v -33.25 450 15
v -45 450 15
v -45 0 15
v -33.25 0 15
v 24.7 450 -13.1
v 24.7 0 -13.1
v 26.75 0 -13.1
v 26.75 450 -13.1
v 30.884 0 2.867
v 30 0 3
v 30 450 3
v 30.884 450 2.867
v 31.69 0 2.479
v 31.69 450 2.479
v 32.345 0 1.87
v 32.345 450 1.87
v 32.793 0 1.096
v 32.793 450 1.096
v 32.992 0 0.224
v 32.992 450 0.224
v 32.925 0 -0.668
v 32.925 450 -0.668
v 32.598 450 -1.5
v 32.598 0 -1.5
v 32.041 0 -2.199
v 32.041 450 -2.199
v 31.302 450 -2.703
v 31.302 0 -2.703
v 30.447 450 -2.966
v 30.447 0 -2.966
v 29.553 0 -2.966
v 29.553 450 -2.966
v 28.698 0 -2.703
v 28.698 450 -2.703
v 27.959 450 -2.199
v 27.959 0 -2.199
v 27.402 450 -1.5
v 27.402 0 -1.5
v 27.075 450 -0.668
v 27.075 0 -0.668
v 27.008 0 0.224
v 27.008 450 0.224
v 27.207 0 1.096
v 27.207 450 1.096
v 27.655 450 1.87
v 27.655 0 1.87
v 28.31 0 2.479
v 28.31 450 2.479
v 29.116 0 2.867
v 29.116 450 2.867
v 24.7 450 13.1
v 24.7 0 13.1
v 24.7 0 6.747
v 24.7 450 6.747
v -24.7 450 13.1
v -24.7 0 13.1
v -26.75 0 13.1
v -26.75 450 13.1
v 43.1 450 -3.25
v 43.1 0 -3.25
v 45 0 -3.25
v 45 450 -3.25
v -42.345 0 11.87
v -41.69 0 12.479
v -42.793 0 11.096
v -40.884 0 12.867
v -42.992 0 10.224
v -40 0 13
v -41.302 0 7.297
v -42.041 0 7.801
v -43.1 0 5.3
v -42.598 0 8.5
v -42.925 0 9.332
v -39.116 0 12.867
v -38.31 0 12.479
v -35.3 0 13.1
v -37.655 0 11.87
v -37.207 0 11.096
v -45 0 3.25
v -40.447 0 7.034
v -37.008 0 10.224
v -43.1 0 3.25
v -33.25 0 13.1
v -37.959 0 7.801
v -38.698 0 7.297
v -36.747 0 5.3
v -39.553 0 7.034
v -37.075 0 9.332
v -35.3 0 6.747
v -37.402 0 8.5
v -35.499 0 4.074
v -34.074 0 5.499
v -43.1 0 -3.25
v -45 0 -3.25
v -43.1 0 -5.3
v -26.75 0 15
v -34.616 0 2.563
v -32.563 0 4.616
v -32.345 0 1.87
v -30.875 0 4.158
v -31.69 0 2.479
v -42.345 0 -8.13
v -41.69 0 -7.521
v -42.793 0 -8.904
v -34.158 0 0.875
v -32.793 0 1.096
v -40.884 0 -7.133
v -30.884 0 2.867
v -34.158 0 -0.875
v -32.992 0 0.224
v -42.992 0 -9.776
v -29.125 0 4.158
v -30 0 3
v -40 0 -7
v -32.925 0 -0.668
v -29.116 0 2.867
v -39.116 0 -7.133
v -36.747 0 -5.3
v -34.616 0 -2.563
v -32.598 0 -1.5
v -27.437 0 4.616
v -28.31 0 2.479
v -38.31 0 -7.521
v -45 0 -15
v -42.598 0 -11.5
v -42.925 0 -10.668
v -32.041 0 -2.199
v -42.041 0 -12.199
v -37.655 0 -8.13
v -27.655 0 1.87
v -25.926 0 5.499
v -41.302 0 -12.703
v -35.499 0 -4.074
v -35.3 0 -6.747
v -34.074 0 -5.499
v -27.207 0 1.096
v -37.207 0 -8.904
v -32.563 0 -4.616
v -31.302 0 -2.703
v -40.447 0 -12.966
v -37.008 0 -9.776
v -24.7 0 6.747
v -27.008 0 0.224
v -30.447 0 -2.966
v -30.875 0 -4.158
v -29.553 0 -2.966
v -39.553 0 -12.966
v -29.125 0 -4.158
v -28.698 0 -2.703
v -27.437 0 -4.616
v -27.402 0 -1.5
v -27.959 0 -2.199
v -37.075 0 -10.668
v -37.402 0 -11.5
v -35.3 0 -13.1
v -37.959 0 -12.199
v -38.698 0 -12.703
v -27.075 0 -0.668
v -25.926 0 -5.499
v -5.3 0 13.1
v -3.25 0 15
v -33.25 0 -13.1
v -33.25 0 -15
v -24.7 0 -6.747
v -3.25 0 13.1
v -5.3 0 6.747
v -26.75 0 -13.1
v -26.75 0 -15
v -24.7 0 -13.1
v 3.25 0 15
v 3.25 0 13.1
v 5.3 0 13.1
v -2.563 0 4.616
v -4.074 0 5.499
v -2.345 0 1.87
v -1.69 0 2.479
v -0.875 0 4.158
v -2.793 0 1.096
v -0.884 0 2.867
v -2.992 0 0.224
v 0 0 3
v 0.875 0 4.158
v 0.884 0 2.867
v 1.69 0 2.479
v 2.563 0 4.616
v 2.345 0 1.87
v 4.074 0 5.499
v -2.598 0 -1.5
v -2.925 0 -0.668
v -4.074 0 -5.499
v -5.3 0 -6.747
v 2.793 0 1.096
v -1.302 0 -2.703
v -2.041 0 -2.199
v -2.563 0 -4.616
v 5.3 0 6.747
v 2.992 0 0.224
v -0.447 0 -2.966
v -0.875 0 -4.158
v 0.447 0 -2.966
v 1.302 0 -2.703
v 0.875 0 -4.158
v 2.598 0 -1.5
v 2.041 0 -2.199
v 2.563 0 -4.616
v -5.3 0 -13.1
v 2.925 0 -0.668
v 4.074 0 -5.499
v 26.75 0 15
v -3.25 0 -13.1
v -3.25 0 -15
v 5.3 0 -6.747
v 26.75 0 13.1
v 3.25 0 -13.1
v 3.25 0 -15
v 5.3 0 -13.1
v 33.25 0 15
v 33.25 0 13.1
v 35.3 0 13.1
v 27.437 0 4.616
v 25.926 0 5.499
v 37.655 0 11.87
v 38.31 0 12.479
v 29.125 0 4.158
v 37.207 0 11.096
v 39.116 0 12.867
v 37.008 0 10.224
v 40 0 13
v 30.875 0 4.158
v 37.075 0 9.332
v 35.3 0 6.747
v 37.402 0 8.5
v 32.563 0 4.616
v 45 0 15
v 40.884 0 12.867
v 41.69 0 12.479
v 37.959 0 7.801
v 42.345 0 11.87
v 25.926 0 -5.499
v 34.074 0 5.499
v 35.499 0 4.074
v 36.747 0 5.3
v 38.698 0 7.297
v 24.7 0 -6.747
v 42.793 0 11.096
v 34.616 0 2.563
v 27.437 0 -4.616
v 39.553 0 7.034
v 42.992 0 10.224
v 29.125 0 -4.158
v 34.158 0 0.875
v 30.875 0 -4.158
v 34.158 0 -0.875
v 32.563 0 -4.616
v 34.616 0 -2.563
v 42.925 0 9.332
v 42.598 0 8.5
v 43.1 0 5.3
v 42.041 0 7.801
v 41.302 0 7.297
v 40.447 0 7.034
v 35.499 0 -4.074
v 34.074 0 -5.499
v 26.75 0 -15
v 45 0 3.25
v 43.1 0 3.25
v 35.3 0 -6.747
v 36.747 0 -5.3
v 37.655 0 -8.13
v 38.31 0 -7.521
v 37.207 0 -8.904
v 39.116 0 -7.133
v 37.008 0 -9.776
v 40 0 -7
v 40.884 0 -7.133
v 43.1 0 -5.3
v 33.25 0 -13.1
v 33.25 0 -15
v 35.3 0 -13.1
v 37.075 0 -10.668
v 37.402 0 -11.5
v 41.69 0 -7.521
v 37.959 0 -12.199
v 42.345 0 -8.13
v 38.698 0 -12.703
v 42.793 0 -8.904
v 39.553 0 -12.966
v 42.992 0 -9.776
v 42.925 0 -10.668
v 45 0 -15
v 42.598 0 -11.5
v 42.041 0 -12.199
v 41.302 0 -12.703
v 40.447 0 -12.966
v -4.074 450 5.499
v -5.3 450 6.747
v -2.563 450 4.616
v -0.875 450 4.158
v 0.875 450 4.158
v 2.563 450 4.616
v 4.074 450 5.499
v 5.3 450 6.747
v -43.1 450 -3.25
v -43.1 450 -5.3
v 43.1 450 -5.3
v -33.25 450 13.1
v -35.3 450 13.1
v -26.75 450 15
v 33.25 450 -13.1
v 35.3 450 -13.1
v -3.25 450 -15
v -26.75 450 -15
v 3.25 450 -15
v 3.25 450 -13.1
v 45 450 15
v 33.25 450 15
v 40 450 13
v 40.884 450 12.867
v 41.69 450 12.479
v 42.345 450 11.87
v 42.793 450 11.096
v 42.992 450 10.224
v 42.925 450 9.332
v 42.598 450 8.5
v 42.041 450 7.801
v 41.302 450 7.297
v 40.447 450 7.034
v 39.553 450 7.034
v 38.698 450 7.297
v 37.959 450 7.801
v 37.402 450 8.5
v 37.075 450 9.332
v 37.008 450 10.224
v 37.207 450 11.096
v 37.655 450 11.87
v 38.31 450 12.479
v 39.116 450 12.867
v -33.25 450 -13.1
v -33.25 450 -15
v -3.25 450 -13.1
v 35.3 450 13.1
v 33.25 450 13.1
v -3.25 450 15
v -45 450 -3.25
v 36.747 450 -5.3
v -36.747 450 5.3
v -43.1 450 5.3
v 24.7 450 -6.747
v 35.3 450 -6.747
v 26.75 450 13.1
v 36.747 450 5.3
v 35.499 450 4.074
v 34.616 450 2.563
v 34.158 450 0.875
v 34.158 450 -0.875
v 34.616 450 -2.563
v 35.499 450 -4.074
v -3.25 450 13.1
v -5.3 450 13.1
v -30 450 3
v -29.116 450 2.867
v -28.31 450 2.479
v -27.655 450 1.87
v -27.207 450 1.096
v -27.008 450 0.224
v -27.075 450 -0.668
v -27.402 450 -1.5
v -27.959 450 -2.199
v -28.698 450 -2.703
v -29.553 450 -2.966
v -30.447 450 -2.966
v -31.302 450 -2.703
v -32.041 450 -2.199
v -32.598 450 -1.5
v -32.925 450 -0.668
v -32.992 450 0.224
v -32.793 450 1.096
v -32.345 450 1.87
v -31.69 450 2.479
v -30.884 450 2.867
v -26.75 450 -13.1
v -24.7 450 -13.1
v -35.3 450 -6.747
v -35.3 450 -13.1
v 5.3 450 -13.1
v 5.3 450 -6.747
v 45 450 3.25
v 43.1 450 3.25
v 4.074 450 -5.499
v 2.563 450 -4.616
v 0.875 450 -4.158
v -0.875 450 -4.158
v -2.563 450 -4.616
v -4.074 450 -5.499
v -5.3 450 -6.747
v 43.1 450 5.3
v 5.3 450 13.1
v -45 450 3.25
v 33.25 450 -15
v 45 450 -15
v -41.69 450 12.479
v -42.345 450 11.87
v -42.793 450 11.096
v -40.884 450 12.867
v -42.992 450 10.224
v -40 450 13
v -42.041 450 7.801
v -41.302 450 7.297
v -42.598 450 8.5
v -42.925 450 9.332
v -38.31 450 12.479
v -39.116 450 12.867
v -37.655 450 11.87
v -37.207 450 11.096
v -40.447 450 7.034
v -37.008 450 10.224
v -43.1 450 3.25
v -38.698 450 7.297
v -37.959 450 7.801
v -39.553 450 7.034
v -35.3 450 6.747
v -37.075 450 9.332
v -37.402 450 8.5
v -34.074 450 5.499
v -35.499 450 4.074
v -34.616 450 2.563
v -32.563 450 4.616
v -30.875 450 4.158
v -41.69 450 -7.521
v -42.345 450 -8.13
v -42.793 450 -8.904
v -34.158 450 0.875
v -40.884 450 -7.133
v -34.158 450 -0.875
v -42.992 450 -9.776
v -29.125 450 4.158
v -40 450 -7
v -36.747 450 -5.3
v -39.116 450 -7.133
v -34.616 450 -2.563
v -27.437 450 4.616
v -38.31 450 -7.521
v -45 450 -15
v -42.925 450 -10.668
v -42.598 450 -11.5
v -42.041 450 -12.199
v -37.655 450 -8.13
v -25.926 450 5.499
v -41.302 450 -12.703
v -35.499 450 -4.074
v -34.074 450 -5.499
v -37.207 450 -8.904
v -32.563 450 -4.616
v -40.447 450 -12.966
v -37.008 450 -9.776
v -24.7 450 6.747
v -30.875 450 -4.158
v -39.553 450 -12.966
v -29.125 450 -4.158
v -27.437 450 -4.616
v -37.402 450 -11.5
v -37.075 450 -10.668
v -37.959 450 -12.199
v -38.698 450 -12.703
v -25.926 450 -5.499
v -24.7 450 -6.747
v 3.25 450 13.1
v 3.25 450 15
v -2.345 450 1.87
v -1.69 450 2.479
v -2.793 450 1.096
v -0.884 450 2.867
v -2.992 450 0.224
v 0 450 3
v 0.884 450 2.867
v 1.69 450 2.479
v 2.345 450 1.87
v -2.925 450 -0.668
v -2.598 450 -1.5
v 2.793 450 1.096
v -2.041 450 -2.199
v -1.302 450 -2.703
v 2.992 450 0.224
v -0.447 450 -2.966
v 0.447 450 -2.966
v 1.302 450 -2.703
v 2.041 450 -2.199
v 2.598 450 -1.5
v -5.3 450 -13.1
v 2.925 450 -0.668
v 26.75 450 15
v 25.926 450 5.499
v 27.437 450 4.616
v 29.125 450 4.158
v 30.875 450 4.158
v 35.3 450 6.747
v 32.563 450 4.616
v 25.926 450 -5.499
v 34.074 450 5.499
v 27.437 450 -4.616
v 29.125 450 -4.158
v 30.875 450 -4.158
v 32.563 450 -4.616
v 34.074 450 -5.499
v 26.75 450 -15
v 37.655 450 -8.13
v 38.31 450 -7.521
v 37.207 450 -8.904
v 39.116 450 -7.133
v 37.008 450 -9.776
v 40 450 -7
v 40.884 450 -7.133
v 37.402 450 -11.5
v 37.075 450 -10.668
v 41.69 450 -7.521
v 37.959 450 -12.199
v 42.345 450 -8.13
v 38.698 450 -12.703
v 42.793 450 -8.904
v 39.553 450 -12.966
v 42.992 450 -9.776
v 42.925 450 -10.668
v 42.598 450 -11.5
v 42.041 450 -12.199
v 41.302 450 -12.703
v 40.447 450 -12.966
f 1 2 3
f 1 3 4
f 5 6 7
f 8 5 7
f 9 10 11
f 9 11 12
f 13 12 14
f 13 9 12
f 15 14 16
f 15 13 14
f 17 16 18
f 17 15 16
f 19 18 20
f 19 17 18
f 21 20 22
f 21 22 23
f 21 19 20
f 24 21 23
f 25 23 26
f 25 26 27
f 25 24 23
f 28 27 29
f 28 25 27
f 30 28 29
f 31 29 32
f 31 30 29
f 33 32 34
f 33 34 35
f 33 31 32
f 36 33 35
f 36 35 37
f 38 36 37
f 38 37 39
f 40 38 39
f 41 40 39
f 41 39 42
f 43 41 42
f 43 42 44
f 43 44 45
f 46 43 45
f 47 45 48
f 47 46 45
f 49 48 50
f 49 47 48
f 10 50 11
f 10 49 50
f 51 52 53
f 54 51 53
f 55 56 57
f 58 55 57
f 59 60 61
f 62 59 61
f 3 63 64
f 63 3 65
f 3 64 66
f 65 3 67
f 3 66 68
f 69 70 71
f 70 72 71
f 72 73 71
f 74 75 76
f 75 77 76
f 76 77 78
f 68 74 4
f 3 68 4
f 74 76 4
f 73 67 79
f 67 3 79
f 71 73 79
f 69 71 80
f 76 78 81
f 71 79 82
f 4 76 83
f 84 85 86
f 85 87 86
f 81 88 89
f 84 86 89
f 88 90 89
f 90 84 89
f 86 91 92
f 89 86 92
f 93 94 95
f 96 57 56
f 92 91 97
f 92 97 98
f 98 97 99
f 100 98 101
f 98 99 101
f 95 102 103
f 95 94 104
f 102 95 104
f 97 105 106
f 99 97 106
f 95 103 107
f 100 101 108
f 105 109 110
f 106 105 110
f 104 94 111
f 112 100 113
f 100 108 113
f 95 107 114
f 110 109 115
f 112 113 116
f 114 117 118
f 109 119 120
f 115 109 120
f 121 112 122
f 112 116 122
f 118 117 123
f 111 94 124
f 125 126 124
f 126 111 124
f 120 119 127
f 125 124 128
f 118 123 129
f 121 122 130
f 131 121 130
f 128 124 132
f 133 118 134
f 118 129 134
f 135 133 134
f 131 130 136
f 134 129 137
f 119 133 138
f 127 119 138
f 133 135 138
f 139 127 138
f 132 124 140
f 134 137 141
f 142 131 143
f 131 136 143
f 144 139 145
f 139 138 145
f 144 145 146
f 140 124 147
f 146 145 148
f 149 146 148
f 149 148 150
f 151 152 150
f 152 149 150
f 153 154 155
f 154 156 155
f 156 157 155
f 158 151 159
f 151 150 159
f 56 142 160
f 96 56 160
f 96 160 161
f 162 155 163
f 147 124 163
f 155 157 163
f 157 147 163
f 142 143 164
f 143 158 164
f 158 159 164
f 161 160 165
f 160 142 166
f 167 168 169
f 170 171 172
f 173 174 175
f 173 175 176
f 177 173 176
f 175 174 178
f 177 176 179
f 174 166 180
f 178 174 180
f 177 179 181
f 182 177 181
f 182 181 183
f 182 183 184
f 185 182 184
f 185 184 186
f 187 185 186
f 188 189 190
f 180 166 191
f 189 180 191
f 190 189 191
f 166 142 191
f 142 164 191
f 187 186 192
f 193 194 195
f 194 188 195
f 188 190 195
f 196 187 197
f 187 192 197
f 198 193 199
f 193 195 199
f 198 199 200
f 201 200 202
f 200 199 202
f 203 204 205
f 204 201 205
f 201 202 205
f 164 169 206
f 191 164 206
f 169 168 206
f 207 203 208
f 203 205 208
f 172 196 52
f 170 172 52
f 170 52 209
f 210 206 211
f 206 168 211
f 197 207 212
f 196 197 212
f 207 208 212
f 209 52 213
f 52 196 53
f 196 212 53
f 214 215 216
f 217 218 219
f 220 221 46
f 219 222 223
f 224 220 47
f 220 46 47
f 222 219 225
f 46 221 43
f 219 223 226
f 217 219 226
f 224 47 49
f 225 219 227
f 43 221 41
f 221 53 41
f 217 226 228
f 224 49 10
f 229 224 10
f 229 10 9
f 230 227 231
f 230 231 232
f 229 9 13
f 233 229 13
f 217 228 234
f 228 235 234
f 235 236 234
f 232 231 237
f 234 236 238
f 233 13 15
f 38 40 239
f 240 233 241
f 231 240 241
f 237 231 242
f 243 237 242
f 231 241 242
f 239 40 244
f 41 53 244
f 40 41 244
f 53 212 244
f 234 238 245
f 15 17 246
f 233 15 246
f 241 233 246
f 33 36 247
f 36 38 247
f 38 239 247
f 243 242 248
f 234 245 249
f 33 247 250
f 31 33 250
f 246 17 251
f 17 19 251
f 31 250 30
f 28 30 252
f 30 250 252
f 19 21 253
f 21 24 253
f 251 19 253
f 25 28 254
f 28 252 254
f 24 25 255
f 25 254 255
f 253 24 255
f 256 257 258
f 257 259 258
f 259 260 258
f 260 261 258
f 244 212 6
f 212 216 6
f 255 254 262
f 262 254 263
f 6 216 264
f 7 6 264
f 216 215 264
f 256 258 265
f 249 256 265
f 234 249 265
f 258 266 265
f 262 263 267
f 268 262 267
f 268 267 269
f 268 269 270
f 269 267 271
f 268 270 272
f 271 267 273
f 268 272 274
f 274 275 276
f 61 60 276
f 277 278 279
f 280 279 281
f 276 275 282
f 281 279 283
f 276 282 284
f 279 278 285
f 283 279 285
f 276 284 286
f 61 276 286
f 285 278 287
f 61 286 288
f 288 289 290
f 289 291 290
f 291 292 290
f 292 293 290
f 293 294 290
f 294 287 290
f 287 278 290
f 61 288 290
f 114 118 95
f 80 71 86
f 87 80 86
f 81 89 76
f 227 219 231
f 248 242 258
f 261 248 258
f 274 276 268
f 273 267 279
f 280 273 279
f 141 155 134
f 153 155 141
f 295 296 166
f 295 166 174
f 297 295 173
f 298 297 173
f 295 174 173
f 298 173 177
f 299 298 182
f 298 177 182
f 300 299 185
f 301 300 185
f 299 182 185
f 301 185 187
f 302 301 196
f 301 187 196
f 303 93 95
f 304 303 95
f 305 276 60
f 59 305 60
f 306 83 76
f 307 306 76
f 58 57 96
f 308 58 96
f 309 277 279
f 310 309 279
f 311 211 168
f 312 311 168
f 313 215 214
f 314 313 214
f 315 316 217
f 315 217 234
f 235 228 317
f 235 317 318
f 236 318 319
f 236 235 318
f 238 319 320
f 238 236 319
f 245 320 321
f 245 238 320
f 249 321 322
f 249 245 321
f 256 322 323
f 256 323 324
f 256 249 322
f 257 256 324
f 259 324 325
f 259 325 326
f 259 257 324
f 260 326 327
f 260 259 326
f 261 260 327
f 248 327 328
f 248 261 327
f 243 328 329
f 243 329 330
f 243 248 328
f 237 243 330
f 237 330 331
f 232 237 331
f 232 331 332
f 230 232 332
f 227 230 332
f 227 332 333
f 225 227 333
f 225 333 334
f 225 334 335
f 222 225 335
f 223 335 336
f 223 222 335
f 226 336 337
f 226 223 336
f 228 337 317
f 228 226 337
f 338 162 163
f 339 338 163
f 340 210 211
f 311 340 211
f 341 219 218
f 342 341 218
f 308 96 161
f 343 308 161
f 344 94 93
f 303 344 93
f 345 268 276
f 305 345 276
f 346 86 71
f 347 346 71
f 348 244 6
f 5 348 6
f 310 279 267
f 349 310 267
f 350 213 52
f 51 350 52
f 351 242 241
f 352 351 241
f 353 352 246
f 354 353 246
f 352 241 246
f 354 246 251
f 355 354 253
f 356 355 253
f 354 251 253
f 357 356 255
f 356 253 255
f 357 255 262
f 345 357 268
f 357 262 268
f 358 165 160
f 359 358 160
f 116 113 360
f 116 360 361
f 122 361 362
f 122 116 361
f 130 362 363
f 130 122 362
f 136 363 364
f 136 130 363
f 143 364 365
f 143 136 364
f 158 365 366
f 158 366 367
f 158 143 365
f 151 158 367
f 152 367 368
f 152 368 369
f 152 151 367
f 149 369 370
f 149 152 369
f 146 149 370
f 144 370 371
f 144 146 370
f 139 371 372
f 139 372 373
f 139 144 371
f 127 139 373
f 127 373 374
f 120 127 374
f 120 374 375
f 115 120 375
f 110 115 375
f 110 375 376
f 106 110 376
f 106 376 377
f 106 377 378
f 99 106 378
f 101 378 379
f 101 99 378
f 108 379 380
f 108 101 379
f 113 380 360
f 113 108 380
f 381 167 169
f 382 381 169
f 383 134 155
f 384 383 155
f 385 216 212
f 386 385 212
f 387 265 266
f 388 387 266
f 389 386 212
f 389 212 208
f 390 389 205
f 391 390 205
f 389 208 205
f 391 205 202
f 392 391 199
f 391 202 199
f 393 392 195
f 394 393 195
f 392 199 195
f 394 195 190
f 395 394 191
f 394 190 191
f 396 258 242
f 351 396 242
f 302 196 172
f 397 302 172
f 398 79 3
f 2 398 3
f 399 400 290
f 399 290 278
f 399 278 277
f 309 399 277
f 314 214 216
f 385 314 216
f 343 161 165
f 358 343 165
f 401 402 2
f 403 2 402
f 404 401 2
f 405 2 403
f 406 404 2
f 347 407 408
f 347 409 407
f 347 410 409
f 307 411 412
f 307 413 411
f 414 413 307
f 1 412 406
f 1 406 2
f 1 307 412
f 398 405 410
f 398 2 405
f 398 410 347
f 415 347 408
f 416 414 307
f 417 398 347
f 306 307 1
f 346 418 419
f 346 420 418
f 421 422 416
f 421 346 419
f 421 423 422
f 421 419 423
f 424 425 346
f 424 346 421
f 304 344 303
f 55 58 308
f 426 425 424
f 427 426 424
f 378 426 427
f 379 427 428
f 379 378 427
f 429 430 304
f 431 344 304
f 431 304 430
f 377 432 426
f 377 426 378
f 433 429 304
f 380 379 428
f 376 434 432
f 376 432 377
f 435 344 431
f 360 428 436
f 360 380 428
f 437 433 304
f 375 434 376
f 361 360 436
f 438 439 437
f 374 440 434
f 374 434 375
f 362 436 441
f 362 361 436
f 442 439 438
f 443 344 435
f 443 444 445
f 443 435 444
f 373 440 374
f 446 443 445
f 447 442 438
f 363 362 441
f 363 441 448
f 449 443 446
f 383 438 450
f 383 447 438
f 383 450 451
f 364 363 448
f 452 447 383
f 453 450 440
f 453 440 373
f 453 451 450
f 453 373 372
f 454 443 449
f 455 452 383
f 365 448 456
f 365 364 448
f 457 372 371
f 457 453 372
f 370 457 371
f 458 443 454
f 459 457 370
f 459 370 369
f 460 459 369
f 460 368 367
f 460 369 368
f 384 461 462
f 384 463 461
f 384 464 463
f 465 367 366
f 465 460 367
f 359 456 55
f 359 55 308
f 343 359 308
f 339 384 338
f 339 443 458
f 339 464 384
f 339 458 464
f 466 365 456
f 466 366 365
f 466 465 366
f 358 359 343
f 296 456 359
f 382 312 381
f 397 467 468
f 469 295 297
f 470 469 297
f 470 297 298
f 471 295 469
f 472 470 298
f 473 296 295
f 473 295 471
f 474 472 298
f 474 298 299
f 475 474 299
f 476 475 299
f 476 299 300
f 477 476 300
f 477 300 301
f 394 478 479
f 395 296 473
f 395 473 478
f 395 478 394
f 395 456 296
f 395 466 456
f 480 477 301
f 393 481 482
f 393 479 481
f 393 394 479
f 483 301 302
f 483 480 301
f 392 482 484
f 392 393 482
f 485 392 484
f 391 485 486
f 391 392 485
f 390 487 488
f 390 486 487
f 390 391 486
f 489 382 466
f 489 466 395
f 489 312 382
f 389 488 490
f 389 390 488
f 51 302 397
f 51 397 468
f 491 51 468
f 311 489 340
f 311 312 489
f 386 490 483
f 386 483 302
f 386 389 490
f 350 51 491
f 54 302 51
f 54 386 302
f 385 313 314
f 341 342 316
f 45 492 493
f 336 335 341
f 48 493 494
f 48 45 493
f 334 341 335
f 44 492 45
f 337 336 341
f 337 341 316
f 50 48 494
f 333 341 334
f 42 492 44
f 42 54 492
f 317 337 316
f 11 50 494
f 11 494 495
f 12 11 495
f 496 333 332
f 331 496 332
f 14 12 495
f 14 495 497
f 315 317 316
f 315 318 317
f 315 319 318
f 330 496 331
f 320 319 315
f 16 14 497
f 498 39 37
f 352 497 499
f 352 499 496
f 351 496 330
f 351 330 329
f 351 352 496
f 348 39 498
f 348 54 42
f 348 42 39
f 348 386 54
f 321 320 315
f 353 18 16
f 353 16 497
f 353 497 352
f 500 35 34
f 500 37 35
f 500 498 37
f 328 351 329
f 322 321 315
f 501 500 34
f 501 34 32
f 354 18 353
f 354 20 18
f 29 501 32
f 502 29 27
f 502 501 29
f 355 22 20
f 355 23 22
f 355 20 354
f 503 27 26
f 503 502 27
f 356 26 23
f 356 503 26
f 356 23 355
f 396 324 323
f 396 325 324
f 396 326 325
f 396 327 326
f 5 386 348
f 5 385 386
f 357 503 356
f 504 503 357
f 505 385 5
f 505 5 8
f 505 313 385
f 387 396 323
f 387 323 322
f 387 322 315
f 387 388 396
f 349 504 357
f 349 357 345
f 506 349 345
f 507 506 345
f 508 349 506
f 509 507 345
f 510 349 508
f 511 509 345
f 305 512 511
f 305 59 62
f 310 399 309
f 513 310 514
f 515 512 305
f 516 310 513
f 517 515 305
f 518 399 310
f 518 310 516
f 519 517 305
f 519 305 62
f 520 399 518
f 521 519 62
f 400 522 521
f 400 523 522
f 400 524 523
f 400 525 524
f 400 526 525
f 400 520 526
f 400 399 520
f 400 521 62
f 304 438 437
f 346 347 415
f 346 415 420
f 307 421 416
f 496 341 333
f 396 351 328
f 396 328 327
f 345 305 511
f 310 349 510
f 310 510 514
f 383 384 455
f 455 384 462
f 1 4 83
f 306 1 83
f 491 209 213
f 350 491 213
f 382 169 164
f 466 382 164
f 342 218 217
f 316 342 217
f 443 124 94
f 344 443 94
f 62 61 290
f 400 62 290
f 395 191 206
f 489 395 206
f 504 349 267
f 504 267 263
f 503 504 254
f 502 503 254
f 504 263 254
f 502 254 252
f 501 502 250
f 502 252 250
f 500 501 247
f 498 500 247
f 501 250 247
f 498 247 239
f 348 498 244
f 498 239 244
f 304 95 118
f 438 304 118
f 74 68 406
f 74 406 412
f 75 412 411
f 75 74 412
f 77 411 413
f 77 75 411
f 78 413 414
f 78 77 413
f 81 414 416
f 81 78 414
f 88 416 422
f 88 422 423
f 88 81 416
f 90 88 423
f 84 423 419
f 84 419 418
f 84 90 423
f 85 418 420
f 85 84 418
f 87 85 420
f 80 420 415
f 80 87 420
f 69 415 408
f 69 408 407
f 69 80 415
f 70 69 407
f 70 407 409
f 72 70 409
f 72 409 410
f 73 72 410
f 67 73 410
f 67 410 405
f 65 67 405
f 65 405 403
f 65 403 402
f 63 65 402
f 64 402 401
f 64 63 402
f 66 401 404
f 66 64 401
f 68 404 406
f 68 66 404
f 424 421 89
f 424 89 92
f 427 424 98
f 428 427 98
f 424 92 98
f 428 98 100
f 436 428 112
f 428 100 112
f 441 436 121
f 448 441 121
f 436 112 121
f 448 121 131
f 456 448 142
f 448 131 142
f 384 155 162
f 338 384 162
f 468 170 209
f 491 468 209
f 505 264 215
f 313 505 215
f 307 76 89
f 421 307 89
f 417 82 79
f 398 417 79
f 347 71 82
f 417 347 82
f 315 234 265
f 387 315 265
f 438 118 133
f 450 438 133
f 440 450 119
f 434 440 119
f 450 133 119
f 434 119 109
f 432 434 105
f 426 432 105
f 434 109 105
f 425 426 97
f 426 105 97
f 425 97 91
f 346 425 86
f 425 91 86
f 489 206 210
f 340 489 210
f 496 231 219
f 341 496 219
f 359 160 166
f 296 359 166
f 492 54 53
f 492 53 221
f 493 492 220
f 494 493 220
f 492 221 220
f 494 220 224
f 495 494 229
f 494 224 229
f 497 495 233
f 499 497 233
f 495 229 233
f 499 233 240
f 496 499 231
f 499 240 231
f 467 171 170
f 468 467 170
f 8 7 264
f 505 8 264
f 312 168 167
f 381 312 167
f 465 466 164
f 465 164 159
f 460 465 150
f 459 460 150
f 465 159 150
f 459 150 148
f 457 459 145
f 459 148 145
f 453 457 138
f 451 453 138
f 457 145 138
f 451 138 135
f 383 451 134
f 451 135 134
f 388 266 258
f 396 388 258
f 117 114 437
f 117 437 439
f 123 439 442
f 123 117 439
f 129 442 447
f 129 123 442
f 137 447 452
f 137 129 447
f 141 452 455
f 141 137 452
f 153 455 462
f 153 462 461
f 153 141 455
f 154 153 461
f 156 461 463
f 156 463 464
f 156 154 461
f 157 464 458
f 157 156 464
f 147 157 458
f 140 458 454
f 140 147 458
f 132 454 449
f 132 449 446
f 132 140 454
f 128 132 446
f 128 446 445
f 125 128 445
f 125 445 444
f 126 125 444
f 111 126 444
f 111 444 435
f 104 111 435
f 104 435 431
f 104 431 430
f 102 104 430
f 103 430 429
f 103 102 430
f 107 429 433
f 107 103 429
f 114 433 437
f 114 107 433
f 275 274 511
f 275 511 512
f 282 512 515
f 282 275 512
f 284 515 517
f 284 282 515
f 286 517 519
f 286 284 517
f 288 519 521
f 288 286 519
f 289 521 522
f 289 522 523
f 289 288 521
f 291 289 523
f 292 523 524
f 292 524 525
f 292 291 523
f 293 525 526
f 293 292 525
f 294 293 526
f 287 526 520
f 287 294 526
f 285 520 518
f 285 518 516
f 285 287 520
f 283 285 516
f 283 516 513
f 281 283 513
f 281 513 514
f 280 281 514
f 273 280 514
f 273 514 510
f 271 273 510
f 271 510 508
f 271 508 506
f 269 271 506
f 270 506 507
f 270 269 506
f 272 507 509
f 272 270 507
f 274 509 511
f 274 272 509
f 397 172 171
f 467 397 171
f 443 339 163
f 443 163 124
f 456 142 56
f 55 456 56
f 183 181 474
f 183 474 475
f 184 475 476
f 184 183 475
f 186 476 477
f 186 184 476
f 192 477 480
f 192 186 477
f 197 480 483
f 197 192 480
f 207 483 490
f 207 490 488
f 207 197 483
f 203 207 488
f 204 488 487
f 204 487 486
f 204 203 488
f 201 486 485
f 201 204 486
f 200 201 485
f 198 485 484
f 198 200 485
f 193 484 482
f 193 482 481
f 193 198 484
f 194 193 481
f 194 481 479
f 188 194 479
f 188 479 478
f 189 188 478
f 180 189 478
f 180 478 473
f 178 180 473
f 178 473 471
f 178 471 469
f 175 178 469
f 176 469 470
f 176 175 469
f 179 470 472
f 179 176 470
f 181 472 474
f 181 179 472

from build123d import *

# Parameters (mm, degrees)
SKETCH_1_R      = 3
EXTRUDE_1_DEPTH = 450


with BuildPart() as part:
    # 草图1 → 凸台-拉伸1 (new body)
    with BuildSketch(Plane(origin=(0, 0, 0), x_dir=(1, 0, 0), z_dir=(0, 1, 0))):
        with BuildLine():
            Line((-33.25, 15), (-45, 15))
            Line((-45, 15), (-45, 3.25))
            Line((-45, 3.25), (-43.1, 3.25))
            Line((-43.1, 3.25), (-43.1, 5.3))
            Line((-43.1, 5.3), (-36.746672245, 5.3))
            ThreePointArc((-36.746672245, 5.3), (-34.1, 0), (-36.746672245, -5.3))
            Line((-36.746672245, -5.3), (-43.1, -5.3))
            Line((-43.1, -5.3), (-43.1, -3.25))
            Line((-43.1, -3.25), (-45, -3.25))
            Line((-45, -3.25), (-45, -15))
            Line((-45, -15), (-33.25, -15))
            Line((-33.25, -15), (-33.25, -13.1))
            Line((-33.25, -13.1), (-35.3, -13.1))
            Line((-35.3, -13.1), (-35.3, -6.746672245))
            ThreePointArc((-35.3, -6.746672245), (-30, -4.1), (-24.7, -6.746672245))
            Line((-24.7, -6.746672245), (-24.7, -13.1))
            Line((-24.7, -13.1), (-26.75, -13.1))
            Line((-26.75, -13.1), (-26.75, -15))
            Line((-26.75, -15), (-3.25, -15))
            Line((-3.25, -15), (-3.25, -13.1))
            Line((-3.25, -13.1), (-5.3, -13.1))
            Line((-5.3, -13.1), (-5.3, -6.746672245))
            ThreePointArc((-5.3, -6.746672245), (0, -4.1), (5.3, -6.746672245))
            Line((5.3, -6.746672245), (5.3, -13.1))
            Line((5.3, -13.1), (3.25, -13.1))
            Line((3.25, -13.1), (3.25, -15))
            Line((3.25, -15), (26.75, -15))
            Line((26.75, -15), (26.75, -13.1))
            Line((26.75, -13.1), (24.7, -13.1))
            Line((24.7, -13.1), (24.7, -6.746672245))
            ThreePointArc((24.7, -6.746672245), (30, -4.1), (35.3, -6.746672245))
            Line((35.3, -6.746672245), (35.3, -13.1))
            Line((35.3, -13.1), (33.25, -13.1))
            Line((33.25, -13.1), (33.25, -15))
            Line((33.25, -15), (45, -15))
            Line((45, -15), (45, -3.25))
            Line((45, -3.25), (43.1, -3.25))
            Line((43.1, -3.25), (43.1, -5.3))
            Line((43.1, -5.3), (36.746672245, -5.3))
            ThreePointArc((36.746672245, -5.3), (34.1, 0), (36.746672245, 5.3))
            Line((36.746672245, 5.3), (43.1, 5.3))
            Line((43.1, 5.3), (43.1, 3.25))
            Line((43.1, 3.25), (45, 3.25))
            Line((45, 3.25), (45, 15))
            Line((45, 15), (33.25, 15))
            Line((33.25, 15), (33.25, 13.1))
            Line((33.25, 13.1), (35.3, 13.1))
            Line((35.3, 13.1), (35.3, 6.746672245))
            ThreePointArc((35.3, 6.746672245), (30, 4.1), (24.7, 6.746672245))
            Line((24.7, 6.746672245), (24.7, 13.1))
            Line((24.7, 13.1), (26.75, 13.1))
            Line((26.75, 13.1), (26.75, 15))
            Line((26.75, 15), (3.25, 15))
            Line((3.25, 15), (3.25, 13.1))
            Line((3.25, 13.1), (5.3, 13.1))
            Line((5.3, 13.1), (5.3, 6.746672245))
            ThreePointArc((5.3, 6.746672245), (0, 4.1), (-5.3, 6.746672245))
            Line((-5.3, 6.746672245), (-5.3, 13.1))
            Line((-5.3, 13.1), (-3.25, 13.1))
            Line((-3.25, 13.1), (-3.25, 15))
            Line((-3.25, 15), (-26.75, 15))
            Line((-26.75, 15), (-26.75, 13.1))
            Line((-26.75, 13.1), (-24.7, 13.1))
            Line((-24.7, 13.1), (-24.7, 6.746672245))
            ThreePointArc((-24.7, 6.746672245), (-30, 4.1), (-35.3, 6.746672245))
            Line((-35.3, 6.746672245), (-35.3, 13.1))
            Line((-35.3, 13.1), (-33.25, 13.1))
            Line((-33.25, 13.1), (-33.25, 15))
        make_face()
        with Locations(Location((-40, -10, 0), (0, 0, 270))):
            Circle(SKETCH_1_R, mode=Mode.SUBTRACT)
        with Locations(Location((-30, 0, 0), (0, 0, 270))):
            Circle(SKETCH_1_R, mode=Mode.SUBTRACT)
        with Locations(Location((0, 0, 0), (0, 0, 270))):
            Circle(SKETCH_1_R, mode=Mode.SUBTRACT)
        with Locations(Location((40, -10, 0), (0, 0, 270))):
            Circle(SKETCH_1_R, mode=Mode.SUBTRACT)
        with Locations(Location((-40, 10, 0), (0, 0, 270))):
            Circle(SKETCH_1_R, mode=Mode.SUBTRACT)
        with Locations(Location((30, 0, 0), (0, 0, 270))):
            Circle(SKETCH_1_R, mode=Mode.SUBTRACT)
        with Locations(Location((40, 10, 0), (0, 0, 270))):
            Circle(SKETCH_1_R, mode=Mode.SUBTRACT)
    extrude(amount=EXTRUDE_1_DEPTH)


solid = part.part
